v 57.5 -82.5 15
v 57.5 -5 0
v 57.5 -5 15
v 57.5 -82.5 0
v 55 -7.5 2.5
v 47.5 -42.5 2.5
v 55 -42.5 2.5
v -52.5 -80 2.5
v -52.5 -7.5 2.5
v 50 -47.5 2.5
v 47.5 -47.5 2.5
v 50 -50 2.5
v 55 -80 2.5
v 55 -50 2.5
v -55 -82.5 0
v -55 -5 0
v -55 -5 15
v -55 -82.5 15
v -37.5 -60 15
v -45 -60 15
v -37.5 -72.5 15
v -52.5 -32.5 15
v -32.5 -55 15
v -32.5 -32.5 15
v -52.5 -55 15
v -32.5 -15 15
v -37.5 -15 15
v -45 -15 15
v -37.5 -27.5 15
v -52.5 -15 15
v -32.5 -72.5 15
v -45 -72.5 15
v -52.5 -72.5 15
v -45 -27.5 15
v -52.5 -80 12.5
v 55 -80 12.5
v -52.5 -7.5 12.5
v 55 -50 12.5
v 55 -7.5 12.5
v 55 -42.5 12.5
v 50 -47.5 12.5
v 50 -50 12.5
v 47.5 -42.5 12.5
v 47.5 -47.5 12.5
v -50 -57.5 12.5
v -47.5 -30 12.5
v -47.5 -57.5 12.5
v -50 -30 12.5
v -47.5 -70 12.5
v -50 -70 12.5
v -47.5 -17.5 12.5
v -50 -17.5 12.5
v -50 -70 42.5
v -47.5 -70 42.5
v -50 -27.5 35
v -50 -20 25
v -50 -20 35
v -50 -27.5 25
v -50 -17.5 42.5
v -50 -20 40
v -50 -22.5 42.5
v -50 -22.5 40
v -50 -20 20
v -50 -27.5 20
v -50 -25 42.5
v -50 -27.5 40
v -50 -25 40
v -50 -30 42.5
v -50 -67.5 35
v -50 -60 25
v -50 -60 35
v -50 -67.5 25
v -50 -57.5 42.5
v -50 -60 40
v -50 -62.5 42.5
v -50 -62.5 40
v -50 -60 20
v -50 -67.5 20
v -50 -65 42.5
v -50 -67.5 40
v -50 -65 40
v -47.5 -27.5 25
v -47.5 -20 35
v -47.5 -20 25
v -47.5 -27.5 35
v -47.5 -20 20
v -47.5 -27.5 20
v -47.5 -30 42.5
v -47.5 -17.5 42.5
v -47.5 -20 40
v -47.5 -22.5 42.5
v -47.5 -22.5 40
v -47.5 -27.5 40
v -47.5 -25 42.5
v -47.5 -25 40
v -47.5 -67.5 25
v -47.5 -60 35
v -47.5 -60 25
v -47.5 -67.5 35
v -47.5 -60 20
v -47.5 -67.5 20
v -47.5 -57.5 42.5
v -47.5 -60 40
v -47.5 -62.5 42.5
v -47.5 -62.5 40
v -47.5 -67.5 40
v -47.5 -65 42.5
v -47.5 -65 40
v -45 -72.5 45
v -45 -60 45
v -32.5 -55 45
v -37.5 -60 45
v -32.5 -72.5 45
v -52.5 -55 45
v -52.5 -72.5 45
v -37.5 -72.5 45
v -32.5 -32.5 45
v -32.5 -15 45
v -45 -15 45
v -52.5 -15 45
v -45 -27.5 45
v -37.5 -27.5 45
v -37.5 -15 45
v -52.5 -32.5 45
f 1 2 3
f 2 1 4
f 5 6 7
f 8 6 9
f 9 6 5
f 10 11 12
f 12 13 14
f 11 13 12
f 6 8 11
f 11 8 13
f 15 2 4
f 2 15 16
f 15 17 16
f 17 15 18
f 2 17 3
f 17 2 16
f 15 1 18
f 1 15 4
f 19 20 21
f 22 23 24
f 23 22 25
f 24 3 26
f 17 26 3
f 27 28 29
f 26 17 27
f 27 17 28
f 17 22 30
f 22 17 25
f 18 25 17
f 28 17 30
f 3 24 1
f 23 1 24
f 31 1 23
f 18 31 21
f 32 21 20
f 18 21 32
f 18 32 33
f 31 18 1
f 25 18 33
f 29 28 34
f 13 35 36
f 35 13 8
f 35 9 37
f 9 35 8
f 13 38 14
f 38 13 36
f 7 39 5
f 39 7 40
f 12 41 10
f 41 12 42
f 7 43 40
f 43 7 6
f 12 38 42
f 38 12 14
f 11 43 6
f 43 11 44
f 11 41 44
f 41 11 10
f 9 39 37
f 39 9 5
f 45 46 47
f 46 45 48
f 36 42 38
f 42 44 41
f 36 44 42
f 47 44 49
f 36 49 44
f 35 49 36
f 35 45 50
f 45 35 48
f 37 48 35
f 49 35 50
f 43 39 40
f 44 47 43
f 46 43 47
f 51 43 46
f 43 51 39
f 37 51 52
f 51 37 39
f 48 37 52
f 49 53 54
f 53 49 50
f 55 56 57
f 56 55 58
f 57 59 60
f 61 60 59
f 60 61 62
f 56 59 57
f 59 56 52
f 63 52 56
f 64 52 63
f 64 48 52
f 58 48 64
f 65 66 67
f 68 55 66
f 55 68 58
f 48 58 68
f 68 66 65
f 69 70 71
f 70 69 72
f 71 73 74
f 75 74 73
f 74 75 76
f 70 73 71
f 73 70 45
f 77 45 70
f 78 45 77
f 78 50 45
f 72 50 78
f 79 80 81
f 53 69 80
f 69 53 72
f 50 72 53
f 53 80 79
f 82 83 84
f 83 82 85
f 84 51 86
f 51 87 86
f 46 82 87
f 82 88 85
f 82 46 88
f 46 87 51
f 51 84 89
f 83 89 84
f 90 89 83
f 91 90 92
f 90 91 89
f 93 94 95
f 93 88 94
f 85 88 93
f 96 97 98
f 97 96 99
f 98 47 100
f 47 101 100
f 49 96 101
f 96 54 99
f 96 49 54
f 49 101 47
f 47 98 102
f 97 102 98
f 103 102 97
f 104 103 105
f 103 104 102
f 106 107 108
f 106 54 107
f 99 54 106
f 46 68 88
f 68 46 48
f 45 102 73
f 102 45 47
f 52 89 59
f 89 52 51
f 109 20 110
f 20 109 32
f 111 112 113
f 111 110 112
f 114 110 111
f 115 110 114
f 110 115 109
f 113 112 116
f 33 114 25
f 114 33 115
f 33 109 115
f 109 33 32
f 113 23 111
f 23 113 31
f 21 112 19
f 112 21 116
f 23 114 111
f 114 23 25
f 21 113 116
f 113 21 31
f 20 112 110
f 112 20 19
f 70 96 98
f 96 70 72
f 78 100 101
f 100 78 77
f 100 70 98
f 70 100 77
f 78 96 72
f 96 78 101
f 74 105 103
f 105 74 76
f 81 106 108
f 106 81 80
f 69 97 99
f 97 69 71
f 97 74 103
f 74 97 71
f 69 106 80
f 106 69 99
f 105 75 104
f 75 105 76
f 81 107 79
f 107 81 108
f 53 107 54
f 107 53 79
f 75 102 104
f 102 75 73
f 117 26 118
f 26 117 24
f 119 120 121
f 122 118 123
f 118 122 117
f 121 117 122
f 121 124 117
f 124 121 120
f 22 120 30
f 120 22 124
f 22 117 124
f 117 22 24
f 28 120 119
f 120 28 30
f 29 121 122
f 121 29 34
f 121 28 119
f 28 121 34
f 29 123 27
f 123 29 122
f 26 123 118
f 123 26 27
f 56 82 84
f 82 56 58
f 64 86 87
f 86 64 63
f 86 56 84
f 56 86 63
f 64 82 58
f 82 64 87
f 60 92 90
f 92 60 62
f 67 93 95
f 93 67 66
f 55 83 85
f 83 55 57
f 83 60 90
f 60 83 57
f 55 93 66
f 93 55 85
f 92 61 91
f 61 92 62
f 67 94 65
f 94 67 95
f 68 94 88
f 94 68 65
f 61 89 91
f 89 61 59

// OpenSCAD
// Parametric cube-mesh reconstruction from base_voxels.scad (merged cubes, not voxels)
pitch = 2.5;
orig_tower_spacing = 38.0;
tower_spacing = orig_tower_spacing; // center-to-center spacing between the two towers
tower_dir = [0, 1, 0];
hole_dims = [7.5, 12.5, 35]; // (x,y,z) cutout size inside each tower
hole_offset = [0,0,0]; // additional offset applied to the hole center (in world axes)

base_boxes = [
  [-55, -82.5, 0, 112.5, 77.5, 2.5],
  [-55, -82.5, 2.5, 112.5, 2.5, 12.5],
  [-55, -80, 2.5, 2.5, 75, 12.5],
  [55, -80, 2.5, 2.5, 75, 12.5],
  [50, -50, 2.5, 5, 7.5, 12.5],
  [47.5, -47.5, 2.5, 2.5, 5, 12.5],
  [-52.5, -7.5, 2.5, 107.5, 2.5, 12.5],
  [-52.5, -80, 12.5, 107.5, 10, 2.5],
  [-52.5, -70, 12.5, 2.5, 62.5, 2.5],
  [-47.5, -70, 12.5, 102.5, 20, 2.5],
  [-50, -57.5, 12.5, 2.5, 27.5, 2.5],
  [-47.5, -50, 12.5, 97.5, 2.5, 2.5],
  [-47.5, -47.5, 12.5, 95, 40, 2.5],
  [47.5, -42.5, 12.5, 7.5, 35, 2.5],
  [-50, -17.5, 12.5, 2.5, 10, 2.5],
];
tower0_boxes = [
  [-52.5, -72.5, 15, 7.5, 2.5, 30],
  [-37.5, -72.5, 15, 5, 17.5, 30],
  [-52.5, -70, 15, 2.5, 15, 30],
  [-47.5, -70, 15, 2.5, 15, 30],
  [-45, -60, 15, 7.5, 5, 30],
  [-50, -57.5, 15, 2.5, 2.5, 30],
  [-50, -67.5, 20, 2.5, 7.5, 5],
  [-50, -67.5, 35, 2.5, 7.5, 5],
  [-50, -65, 40, 2.5, 2.5, 5],
  [-50, -70, 42.5, 2.5, 5, 2.5],
  [-50, -62.5, 42.5, 2.5, 5, 2.5],
];
tower1_boxes = [
  [-52.5, -32.5, 15, 20, 2.5, 30],
  [-52.5, -30, 15, 2.5, 15, 30],
  [-47.5, -30, 15, 15, 2.5, 30],
  [-47.5, -27.5, 15, 2.5, 12.5, 30],
  [-37.5, -27.5, 15, 5, 12.5, 30],
  [-50, -17.5, 15, 2.5, 2.5, 30],
  [-50, -27.5, 20, 2.5, 7.5, 5],
  [-50, -27.5, 35, 2.5, 7.5, 5],
  [-50, -25, 40, 2.5, 2.5, 5],
  [-50, -30, 42.5, 2.5, 5, 2.5],
  [-50, -22.5, 42.5, 2.5, 5, 2.5],
];
tower0_center = [-42.417, -62.750, 30.178];
tower1_center = [-42.417, -24.750, 30.178];
tower0_hole_rel = [1.167, -3.500, 0.000];
tower1_hole_rel = [1.167, 3.500, 0.000];


module draw_boxes(B) {
  for (b = B) {
    translate([b[0], b[1], b[2]]) cube([b[3], b[4], b[5]], center=false);
  }
}

module tower(B, tower_center, hole_rel) {
  difference() {
    draw_boxes(B);
    translate(tower_center + hole_rel + hole_offset)
      cube(hole_dims, center=true);
  }
}

module model() {
  // Base stays fixed
  draw_boxes(base_boxes);

  // Move towers symmetrically along tower_dir to achieve tower_spacing
  delta = (tower_spacing - orig_tower_spacing) / 2;
  shift = [tower_dir[0]*delta, tower_dir[1]*delta, tower_dir[2]*delta];

  translate(-shift) tower(tower0_boxes, tower0_center, tower0_hole_rel);
  translate( shift) tower(tower1_boxes, tower1_center, tower1_hole_rel);
}

model();
